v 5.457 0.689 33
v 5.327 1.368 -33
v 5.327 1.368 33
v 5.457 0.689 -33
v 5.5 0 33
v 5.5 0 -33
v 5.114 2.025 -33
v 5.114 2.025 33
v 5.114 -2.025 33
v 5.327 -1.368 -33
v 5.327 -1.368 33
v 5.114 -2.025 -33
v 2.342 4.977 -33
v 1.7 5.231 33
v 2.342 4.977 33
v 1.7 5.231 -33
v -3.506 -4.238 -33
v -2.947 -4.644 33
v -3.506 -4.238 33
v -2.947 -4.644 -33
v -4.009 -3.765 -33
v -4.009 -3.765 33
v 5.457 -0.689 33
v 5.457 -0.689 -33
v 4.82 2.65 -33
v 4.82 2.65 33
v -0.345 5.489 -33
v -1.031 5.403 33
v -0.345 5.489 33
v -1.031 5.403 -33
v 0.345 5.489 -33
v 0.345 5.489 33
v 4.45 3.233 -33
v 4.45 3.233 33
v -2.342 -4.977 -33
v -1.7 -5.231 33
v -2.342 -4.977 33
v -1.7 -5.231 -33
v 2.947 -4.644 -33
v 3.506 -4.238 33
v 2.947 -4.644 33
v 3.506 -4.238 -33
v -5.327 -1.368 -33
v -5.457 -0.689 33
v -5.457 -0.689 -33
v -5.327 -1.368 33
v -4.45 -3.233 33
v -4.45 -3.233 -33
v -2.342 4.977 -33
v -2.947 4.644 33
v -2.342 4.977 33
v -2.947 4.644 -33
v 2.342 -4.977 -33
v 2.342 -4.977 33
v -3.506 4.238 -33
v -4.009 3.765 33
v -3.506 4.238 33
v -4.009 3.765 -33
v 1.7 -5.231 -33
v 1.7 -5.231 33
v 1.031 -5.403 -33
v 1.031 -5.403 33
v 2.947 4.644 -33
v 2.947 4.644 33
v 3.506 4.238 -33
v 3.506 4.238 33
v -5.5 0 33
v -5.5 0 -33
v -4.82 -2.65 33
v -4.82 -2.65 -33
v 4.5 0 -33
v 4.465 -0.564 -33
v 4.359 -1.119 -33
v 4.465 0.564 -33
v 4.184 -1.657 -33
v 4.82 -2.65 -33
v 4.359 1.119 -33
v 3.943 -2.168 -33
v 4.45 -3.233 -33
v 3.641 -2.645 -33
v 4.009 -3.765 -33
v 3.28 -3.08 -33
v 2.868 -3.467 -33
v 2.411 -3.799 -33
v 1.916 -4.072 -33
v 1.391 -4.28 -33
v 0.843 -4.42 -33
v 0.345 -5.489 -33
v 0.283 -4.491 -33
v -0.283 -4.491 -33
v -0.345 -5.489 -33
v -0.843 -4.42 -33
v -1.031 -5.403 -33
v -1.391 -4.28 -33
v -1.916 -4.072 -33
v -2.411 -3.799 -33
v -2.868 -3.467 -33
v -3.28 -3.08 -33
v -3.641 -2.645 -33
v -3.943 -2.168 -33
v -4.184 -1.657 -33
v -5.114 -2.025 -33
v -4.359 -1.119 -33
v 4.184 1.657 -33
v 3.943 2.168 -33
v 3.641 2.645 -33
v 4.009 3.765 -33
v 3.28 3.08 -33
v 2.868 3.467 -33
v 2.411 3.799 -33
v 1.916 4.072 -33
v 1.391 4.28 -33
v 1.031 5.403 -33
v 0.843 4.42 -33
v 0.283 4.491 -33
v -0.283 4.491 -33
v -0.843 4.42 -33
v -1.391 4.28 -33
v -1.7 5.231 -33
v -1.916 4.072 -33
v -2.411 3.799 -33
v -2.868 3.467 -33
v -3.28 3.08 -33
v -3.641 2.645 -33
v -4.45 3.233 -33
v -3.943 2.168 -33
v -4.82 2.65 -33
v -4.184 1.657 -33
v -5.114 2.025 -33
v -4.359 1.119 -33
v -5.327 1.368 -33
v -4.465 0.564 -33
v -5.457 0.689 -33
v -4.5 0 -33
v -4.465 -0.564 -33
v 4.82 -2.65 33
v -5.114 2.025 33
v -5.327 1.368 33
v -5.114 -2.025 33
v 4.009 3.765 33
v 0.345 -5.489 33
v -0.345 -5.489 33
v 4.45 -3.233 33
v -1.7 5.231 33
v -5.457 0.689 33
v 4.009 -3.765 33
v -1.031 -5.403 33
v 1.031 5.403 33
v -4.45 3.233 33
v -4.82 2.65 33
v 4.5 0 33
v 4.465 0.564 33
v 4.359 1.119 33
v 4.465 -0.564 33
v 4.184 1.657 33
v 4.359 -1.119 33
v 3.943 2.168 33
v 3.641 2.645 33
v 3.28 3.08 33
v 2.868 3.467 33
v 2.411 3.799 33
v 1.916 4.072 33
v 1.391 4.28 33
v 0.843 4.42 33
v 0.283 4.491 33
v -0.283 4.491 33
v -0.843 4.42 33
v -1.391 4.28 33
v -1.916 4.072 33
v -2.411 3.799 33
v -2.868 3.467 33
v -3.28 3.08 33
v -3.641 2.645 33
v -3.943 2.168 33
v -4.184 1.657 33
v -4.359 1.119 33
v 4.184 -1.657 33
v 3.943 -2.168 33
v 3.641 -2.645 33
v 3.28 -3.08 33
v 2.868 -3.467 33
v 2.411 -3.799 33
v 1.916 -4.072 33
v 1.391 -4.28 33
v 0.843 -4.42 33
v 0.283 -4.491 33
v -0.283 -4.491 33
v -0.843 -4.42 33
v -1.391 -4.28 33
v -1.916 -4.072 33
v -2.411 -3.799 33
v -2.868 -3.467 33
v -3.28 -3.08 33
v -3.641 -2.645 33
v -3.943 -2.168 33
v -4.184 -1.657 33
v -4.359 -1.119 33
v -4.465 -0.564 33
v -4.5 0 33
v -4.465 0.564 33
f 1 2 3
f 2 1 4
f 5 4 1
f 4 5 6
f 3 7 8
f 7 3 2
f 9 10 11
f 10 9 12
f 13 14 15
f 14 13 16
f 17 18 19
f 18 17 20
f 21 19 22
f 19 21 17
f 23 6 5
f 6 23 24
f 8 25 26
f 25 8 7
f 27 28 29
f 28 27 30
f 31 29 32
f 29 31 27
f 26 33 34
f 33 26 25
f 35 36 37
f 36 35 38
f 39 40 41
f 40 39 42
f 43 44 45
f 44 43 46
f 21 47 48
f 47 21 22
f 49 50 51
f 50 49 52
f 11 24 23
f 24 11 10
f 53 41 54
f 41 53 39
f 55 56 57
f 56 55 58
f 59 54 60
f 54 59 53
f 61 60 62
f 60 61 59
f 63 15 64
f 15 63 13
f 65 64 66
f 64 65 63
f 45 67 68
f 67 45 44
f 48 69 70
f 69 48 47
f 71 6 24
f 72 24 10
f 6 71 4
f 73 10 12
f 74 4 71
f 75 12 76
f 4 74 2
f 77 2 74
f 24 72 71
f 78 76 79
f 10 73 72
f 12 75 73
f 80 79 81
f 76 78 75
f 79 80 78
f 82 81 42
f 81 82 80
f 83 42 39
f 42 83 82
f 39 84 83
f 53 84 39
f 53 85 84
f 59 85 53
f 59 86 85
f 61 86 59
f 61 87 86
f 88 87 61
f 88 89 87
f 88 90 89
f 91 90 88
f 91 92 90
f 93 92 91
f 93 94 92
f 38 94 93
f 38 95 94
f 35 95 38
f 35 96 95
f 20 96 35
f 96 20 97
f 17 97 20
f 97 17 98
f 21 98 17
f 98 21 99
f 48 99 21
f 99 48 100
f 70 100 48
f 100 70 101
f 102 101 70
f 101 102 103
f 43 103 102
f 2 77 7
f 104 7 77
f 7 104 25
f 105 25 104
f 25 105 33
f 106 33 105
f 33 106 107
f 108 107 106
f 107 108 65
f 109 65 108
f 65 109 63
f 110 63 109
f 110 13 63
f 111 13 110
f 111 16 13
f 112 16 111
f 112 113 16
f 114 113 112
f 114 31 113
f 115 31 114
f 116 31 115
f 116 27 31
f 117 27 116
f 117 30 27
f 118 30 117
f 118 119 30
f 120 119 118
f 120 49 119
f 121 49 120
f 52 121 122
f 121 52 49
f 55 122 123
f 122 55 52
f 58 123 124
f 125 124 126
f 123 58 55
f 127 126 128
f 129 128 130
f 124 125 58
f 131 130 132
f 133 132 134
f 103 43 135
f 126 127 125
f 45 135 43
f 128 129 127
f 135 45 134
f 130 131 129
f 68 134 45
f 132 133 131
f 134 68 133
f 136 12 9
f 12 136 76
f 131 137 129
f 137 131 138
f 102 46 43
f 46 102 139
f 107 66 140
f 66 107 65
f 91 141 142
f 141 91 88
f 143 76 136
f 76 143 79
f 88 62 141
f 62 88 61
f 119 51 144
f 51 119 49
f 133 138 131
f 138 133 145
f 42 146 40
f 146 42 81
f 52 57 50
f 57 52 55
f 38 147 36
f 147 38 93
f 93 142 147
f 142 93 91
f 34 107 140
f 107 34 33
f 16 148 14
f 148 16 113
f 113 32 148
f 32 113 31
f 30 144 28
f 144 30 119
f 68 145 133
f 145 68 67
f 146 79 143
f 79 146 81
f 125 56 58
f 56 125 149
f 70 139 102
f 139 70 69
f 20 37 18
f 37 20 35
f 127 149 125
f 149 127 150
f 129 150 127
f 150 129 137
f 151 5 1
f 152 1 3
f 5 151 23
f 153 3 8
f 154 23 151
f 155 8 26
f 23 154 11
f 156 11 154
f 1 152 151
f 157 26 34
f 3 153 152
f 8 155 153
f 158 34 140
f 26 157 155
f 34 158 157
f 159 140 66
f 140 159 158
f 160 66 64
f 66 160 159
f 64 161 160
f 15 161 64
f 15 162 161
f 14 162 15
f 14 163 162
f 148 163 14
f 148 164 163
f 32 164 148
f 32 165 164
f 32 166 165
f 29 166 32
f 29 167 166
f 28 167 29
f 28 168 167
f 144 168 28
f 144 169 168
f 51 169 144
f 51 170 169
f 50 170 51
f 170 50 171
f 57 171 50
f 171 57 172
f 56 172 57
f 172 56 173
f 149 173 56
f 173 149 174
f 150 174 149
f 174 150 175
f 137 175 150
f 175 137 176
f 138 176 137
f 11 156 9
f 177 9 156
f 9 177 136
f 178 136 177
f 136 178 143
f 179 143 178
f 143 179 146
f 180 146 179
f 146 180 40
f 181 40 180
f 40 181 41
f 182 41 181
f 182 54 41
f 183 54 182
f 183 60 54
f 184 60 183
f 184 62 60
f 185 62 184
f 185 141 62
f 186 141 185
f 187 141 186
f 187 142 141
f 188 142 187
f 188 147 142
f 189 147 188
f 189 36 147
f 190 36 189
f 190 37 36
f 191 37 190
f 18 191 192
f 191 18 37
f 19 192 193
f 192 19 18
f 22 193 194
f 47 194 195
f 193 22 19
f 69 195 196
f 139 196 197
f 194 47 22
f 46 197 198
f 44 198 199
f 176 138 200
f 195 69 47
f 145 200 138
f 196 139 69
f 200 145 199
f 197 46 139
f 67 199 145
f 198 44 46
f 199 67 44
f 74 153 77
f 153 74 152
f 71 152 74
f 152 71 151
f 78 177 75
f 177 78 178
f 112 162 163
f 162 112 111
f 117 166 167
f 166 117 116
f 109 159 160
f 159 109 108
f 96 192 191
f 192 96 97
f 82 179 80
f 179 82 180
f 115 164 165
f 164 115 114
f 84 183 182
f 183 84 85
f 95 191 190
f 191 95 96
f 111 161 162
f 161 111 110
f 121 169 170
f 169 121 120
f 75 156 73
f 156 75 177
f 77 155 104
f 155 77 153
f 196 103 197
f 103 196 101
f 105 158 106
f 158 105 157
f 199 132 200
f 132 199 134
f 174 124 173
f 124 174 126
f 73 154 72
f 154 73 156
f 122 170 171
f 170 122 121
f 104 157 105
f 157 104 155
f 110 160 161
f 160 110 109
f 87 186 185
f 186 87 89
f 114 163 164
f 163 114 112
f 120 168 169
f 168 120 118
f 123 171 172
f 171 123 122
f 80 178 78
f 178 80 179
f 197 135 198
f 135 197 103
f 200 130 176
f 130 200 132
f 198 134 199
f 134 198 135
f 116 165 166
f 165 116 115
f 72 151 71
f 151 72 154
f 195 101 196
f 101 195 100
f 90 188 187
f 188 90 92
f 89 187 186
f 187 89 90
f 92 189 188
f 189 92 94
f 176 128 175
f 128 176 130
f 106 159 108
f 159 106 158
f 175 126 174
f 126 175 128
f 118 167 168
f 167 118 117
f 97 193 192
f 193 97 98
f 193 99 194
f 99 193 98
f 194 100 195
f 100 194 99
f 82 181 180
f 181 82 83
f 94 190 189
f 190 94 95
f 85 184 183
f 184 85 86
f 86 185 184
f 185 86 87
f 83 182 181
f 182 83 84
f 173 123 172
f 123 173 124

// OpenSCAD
$fn = 50;


difference() {
	union() {
		translate(v = [0, 0, -33.0000000000]) {
			cylinder(h = 66, r = 5.5000000000);
		}
	}
	union() {
		translate(v = [0, 0, -100.0000000000]) {
			cylinder(h = 200, r = 4.5000000000);
		}
	}
}
